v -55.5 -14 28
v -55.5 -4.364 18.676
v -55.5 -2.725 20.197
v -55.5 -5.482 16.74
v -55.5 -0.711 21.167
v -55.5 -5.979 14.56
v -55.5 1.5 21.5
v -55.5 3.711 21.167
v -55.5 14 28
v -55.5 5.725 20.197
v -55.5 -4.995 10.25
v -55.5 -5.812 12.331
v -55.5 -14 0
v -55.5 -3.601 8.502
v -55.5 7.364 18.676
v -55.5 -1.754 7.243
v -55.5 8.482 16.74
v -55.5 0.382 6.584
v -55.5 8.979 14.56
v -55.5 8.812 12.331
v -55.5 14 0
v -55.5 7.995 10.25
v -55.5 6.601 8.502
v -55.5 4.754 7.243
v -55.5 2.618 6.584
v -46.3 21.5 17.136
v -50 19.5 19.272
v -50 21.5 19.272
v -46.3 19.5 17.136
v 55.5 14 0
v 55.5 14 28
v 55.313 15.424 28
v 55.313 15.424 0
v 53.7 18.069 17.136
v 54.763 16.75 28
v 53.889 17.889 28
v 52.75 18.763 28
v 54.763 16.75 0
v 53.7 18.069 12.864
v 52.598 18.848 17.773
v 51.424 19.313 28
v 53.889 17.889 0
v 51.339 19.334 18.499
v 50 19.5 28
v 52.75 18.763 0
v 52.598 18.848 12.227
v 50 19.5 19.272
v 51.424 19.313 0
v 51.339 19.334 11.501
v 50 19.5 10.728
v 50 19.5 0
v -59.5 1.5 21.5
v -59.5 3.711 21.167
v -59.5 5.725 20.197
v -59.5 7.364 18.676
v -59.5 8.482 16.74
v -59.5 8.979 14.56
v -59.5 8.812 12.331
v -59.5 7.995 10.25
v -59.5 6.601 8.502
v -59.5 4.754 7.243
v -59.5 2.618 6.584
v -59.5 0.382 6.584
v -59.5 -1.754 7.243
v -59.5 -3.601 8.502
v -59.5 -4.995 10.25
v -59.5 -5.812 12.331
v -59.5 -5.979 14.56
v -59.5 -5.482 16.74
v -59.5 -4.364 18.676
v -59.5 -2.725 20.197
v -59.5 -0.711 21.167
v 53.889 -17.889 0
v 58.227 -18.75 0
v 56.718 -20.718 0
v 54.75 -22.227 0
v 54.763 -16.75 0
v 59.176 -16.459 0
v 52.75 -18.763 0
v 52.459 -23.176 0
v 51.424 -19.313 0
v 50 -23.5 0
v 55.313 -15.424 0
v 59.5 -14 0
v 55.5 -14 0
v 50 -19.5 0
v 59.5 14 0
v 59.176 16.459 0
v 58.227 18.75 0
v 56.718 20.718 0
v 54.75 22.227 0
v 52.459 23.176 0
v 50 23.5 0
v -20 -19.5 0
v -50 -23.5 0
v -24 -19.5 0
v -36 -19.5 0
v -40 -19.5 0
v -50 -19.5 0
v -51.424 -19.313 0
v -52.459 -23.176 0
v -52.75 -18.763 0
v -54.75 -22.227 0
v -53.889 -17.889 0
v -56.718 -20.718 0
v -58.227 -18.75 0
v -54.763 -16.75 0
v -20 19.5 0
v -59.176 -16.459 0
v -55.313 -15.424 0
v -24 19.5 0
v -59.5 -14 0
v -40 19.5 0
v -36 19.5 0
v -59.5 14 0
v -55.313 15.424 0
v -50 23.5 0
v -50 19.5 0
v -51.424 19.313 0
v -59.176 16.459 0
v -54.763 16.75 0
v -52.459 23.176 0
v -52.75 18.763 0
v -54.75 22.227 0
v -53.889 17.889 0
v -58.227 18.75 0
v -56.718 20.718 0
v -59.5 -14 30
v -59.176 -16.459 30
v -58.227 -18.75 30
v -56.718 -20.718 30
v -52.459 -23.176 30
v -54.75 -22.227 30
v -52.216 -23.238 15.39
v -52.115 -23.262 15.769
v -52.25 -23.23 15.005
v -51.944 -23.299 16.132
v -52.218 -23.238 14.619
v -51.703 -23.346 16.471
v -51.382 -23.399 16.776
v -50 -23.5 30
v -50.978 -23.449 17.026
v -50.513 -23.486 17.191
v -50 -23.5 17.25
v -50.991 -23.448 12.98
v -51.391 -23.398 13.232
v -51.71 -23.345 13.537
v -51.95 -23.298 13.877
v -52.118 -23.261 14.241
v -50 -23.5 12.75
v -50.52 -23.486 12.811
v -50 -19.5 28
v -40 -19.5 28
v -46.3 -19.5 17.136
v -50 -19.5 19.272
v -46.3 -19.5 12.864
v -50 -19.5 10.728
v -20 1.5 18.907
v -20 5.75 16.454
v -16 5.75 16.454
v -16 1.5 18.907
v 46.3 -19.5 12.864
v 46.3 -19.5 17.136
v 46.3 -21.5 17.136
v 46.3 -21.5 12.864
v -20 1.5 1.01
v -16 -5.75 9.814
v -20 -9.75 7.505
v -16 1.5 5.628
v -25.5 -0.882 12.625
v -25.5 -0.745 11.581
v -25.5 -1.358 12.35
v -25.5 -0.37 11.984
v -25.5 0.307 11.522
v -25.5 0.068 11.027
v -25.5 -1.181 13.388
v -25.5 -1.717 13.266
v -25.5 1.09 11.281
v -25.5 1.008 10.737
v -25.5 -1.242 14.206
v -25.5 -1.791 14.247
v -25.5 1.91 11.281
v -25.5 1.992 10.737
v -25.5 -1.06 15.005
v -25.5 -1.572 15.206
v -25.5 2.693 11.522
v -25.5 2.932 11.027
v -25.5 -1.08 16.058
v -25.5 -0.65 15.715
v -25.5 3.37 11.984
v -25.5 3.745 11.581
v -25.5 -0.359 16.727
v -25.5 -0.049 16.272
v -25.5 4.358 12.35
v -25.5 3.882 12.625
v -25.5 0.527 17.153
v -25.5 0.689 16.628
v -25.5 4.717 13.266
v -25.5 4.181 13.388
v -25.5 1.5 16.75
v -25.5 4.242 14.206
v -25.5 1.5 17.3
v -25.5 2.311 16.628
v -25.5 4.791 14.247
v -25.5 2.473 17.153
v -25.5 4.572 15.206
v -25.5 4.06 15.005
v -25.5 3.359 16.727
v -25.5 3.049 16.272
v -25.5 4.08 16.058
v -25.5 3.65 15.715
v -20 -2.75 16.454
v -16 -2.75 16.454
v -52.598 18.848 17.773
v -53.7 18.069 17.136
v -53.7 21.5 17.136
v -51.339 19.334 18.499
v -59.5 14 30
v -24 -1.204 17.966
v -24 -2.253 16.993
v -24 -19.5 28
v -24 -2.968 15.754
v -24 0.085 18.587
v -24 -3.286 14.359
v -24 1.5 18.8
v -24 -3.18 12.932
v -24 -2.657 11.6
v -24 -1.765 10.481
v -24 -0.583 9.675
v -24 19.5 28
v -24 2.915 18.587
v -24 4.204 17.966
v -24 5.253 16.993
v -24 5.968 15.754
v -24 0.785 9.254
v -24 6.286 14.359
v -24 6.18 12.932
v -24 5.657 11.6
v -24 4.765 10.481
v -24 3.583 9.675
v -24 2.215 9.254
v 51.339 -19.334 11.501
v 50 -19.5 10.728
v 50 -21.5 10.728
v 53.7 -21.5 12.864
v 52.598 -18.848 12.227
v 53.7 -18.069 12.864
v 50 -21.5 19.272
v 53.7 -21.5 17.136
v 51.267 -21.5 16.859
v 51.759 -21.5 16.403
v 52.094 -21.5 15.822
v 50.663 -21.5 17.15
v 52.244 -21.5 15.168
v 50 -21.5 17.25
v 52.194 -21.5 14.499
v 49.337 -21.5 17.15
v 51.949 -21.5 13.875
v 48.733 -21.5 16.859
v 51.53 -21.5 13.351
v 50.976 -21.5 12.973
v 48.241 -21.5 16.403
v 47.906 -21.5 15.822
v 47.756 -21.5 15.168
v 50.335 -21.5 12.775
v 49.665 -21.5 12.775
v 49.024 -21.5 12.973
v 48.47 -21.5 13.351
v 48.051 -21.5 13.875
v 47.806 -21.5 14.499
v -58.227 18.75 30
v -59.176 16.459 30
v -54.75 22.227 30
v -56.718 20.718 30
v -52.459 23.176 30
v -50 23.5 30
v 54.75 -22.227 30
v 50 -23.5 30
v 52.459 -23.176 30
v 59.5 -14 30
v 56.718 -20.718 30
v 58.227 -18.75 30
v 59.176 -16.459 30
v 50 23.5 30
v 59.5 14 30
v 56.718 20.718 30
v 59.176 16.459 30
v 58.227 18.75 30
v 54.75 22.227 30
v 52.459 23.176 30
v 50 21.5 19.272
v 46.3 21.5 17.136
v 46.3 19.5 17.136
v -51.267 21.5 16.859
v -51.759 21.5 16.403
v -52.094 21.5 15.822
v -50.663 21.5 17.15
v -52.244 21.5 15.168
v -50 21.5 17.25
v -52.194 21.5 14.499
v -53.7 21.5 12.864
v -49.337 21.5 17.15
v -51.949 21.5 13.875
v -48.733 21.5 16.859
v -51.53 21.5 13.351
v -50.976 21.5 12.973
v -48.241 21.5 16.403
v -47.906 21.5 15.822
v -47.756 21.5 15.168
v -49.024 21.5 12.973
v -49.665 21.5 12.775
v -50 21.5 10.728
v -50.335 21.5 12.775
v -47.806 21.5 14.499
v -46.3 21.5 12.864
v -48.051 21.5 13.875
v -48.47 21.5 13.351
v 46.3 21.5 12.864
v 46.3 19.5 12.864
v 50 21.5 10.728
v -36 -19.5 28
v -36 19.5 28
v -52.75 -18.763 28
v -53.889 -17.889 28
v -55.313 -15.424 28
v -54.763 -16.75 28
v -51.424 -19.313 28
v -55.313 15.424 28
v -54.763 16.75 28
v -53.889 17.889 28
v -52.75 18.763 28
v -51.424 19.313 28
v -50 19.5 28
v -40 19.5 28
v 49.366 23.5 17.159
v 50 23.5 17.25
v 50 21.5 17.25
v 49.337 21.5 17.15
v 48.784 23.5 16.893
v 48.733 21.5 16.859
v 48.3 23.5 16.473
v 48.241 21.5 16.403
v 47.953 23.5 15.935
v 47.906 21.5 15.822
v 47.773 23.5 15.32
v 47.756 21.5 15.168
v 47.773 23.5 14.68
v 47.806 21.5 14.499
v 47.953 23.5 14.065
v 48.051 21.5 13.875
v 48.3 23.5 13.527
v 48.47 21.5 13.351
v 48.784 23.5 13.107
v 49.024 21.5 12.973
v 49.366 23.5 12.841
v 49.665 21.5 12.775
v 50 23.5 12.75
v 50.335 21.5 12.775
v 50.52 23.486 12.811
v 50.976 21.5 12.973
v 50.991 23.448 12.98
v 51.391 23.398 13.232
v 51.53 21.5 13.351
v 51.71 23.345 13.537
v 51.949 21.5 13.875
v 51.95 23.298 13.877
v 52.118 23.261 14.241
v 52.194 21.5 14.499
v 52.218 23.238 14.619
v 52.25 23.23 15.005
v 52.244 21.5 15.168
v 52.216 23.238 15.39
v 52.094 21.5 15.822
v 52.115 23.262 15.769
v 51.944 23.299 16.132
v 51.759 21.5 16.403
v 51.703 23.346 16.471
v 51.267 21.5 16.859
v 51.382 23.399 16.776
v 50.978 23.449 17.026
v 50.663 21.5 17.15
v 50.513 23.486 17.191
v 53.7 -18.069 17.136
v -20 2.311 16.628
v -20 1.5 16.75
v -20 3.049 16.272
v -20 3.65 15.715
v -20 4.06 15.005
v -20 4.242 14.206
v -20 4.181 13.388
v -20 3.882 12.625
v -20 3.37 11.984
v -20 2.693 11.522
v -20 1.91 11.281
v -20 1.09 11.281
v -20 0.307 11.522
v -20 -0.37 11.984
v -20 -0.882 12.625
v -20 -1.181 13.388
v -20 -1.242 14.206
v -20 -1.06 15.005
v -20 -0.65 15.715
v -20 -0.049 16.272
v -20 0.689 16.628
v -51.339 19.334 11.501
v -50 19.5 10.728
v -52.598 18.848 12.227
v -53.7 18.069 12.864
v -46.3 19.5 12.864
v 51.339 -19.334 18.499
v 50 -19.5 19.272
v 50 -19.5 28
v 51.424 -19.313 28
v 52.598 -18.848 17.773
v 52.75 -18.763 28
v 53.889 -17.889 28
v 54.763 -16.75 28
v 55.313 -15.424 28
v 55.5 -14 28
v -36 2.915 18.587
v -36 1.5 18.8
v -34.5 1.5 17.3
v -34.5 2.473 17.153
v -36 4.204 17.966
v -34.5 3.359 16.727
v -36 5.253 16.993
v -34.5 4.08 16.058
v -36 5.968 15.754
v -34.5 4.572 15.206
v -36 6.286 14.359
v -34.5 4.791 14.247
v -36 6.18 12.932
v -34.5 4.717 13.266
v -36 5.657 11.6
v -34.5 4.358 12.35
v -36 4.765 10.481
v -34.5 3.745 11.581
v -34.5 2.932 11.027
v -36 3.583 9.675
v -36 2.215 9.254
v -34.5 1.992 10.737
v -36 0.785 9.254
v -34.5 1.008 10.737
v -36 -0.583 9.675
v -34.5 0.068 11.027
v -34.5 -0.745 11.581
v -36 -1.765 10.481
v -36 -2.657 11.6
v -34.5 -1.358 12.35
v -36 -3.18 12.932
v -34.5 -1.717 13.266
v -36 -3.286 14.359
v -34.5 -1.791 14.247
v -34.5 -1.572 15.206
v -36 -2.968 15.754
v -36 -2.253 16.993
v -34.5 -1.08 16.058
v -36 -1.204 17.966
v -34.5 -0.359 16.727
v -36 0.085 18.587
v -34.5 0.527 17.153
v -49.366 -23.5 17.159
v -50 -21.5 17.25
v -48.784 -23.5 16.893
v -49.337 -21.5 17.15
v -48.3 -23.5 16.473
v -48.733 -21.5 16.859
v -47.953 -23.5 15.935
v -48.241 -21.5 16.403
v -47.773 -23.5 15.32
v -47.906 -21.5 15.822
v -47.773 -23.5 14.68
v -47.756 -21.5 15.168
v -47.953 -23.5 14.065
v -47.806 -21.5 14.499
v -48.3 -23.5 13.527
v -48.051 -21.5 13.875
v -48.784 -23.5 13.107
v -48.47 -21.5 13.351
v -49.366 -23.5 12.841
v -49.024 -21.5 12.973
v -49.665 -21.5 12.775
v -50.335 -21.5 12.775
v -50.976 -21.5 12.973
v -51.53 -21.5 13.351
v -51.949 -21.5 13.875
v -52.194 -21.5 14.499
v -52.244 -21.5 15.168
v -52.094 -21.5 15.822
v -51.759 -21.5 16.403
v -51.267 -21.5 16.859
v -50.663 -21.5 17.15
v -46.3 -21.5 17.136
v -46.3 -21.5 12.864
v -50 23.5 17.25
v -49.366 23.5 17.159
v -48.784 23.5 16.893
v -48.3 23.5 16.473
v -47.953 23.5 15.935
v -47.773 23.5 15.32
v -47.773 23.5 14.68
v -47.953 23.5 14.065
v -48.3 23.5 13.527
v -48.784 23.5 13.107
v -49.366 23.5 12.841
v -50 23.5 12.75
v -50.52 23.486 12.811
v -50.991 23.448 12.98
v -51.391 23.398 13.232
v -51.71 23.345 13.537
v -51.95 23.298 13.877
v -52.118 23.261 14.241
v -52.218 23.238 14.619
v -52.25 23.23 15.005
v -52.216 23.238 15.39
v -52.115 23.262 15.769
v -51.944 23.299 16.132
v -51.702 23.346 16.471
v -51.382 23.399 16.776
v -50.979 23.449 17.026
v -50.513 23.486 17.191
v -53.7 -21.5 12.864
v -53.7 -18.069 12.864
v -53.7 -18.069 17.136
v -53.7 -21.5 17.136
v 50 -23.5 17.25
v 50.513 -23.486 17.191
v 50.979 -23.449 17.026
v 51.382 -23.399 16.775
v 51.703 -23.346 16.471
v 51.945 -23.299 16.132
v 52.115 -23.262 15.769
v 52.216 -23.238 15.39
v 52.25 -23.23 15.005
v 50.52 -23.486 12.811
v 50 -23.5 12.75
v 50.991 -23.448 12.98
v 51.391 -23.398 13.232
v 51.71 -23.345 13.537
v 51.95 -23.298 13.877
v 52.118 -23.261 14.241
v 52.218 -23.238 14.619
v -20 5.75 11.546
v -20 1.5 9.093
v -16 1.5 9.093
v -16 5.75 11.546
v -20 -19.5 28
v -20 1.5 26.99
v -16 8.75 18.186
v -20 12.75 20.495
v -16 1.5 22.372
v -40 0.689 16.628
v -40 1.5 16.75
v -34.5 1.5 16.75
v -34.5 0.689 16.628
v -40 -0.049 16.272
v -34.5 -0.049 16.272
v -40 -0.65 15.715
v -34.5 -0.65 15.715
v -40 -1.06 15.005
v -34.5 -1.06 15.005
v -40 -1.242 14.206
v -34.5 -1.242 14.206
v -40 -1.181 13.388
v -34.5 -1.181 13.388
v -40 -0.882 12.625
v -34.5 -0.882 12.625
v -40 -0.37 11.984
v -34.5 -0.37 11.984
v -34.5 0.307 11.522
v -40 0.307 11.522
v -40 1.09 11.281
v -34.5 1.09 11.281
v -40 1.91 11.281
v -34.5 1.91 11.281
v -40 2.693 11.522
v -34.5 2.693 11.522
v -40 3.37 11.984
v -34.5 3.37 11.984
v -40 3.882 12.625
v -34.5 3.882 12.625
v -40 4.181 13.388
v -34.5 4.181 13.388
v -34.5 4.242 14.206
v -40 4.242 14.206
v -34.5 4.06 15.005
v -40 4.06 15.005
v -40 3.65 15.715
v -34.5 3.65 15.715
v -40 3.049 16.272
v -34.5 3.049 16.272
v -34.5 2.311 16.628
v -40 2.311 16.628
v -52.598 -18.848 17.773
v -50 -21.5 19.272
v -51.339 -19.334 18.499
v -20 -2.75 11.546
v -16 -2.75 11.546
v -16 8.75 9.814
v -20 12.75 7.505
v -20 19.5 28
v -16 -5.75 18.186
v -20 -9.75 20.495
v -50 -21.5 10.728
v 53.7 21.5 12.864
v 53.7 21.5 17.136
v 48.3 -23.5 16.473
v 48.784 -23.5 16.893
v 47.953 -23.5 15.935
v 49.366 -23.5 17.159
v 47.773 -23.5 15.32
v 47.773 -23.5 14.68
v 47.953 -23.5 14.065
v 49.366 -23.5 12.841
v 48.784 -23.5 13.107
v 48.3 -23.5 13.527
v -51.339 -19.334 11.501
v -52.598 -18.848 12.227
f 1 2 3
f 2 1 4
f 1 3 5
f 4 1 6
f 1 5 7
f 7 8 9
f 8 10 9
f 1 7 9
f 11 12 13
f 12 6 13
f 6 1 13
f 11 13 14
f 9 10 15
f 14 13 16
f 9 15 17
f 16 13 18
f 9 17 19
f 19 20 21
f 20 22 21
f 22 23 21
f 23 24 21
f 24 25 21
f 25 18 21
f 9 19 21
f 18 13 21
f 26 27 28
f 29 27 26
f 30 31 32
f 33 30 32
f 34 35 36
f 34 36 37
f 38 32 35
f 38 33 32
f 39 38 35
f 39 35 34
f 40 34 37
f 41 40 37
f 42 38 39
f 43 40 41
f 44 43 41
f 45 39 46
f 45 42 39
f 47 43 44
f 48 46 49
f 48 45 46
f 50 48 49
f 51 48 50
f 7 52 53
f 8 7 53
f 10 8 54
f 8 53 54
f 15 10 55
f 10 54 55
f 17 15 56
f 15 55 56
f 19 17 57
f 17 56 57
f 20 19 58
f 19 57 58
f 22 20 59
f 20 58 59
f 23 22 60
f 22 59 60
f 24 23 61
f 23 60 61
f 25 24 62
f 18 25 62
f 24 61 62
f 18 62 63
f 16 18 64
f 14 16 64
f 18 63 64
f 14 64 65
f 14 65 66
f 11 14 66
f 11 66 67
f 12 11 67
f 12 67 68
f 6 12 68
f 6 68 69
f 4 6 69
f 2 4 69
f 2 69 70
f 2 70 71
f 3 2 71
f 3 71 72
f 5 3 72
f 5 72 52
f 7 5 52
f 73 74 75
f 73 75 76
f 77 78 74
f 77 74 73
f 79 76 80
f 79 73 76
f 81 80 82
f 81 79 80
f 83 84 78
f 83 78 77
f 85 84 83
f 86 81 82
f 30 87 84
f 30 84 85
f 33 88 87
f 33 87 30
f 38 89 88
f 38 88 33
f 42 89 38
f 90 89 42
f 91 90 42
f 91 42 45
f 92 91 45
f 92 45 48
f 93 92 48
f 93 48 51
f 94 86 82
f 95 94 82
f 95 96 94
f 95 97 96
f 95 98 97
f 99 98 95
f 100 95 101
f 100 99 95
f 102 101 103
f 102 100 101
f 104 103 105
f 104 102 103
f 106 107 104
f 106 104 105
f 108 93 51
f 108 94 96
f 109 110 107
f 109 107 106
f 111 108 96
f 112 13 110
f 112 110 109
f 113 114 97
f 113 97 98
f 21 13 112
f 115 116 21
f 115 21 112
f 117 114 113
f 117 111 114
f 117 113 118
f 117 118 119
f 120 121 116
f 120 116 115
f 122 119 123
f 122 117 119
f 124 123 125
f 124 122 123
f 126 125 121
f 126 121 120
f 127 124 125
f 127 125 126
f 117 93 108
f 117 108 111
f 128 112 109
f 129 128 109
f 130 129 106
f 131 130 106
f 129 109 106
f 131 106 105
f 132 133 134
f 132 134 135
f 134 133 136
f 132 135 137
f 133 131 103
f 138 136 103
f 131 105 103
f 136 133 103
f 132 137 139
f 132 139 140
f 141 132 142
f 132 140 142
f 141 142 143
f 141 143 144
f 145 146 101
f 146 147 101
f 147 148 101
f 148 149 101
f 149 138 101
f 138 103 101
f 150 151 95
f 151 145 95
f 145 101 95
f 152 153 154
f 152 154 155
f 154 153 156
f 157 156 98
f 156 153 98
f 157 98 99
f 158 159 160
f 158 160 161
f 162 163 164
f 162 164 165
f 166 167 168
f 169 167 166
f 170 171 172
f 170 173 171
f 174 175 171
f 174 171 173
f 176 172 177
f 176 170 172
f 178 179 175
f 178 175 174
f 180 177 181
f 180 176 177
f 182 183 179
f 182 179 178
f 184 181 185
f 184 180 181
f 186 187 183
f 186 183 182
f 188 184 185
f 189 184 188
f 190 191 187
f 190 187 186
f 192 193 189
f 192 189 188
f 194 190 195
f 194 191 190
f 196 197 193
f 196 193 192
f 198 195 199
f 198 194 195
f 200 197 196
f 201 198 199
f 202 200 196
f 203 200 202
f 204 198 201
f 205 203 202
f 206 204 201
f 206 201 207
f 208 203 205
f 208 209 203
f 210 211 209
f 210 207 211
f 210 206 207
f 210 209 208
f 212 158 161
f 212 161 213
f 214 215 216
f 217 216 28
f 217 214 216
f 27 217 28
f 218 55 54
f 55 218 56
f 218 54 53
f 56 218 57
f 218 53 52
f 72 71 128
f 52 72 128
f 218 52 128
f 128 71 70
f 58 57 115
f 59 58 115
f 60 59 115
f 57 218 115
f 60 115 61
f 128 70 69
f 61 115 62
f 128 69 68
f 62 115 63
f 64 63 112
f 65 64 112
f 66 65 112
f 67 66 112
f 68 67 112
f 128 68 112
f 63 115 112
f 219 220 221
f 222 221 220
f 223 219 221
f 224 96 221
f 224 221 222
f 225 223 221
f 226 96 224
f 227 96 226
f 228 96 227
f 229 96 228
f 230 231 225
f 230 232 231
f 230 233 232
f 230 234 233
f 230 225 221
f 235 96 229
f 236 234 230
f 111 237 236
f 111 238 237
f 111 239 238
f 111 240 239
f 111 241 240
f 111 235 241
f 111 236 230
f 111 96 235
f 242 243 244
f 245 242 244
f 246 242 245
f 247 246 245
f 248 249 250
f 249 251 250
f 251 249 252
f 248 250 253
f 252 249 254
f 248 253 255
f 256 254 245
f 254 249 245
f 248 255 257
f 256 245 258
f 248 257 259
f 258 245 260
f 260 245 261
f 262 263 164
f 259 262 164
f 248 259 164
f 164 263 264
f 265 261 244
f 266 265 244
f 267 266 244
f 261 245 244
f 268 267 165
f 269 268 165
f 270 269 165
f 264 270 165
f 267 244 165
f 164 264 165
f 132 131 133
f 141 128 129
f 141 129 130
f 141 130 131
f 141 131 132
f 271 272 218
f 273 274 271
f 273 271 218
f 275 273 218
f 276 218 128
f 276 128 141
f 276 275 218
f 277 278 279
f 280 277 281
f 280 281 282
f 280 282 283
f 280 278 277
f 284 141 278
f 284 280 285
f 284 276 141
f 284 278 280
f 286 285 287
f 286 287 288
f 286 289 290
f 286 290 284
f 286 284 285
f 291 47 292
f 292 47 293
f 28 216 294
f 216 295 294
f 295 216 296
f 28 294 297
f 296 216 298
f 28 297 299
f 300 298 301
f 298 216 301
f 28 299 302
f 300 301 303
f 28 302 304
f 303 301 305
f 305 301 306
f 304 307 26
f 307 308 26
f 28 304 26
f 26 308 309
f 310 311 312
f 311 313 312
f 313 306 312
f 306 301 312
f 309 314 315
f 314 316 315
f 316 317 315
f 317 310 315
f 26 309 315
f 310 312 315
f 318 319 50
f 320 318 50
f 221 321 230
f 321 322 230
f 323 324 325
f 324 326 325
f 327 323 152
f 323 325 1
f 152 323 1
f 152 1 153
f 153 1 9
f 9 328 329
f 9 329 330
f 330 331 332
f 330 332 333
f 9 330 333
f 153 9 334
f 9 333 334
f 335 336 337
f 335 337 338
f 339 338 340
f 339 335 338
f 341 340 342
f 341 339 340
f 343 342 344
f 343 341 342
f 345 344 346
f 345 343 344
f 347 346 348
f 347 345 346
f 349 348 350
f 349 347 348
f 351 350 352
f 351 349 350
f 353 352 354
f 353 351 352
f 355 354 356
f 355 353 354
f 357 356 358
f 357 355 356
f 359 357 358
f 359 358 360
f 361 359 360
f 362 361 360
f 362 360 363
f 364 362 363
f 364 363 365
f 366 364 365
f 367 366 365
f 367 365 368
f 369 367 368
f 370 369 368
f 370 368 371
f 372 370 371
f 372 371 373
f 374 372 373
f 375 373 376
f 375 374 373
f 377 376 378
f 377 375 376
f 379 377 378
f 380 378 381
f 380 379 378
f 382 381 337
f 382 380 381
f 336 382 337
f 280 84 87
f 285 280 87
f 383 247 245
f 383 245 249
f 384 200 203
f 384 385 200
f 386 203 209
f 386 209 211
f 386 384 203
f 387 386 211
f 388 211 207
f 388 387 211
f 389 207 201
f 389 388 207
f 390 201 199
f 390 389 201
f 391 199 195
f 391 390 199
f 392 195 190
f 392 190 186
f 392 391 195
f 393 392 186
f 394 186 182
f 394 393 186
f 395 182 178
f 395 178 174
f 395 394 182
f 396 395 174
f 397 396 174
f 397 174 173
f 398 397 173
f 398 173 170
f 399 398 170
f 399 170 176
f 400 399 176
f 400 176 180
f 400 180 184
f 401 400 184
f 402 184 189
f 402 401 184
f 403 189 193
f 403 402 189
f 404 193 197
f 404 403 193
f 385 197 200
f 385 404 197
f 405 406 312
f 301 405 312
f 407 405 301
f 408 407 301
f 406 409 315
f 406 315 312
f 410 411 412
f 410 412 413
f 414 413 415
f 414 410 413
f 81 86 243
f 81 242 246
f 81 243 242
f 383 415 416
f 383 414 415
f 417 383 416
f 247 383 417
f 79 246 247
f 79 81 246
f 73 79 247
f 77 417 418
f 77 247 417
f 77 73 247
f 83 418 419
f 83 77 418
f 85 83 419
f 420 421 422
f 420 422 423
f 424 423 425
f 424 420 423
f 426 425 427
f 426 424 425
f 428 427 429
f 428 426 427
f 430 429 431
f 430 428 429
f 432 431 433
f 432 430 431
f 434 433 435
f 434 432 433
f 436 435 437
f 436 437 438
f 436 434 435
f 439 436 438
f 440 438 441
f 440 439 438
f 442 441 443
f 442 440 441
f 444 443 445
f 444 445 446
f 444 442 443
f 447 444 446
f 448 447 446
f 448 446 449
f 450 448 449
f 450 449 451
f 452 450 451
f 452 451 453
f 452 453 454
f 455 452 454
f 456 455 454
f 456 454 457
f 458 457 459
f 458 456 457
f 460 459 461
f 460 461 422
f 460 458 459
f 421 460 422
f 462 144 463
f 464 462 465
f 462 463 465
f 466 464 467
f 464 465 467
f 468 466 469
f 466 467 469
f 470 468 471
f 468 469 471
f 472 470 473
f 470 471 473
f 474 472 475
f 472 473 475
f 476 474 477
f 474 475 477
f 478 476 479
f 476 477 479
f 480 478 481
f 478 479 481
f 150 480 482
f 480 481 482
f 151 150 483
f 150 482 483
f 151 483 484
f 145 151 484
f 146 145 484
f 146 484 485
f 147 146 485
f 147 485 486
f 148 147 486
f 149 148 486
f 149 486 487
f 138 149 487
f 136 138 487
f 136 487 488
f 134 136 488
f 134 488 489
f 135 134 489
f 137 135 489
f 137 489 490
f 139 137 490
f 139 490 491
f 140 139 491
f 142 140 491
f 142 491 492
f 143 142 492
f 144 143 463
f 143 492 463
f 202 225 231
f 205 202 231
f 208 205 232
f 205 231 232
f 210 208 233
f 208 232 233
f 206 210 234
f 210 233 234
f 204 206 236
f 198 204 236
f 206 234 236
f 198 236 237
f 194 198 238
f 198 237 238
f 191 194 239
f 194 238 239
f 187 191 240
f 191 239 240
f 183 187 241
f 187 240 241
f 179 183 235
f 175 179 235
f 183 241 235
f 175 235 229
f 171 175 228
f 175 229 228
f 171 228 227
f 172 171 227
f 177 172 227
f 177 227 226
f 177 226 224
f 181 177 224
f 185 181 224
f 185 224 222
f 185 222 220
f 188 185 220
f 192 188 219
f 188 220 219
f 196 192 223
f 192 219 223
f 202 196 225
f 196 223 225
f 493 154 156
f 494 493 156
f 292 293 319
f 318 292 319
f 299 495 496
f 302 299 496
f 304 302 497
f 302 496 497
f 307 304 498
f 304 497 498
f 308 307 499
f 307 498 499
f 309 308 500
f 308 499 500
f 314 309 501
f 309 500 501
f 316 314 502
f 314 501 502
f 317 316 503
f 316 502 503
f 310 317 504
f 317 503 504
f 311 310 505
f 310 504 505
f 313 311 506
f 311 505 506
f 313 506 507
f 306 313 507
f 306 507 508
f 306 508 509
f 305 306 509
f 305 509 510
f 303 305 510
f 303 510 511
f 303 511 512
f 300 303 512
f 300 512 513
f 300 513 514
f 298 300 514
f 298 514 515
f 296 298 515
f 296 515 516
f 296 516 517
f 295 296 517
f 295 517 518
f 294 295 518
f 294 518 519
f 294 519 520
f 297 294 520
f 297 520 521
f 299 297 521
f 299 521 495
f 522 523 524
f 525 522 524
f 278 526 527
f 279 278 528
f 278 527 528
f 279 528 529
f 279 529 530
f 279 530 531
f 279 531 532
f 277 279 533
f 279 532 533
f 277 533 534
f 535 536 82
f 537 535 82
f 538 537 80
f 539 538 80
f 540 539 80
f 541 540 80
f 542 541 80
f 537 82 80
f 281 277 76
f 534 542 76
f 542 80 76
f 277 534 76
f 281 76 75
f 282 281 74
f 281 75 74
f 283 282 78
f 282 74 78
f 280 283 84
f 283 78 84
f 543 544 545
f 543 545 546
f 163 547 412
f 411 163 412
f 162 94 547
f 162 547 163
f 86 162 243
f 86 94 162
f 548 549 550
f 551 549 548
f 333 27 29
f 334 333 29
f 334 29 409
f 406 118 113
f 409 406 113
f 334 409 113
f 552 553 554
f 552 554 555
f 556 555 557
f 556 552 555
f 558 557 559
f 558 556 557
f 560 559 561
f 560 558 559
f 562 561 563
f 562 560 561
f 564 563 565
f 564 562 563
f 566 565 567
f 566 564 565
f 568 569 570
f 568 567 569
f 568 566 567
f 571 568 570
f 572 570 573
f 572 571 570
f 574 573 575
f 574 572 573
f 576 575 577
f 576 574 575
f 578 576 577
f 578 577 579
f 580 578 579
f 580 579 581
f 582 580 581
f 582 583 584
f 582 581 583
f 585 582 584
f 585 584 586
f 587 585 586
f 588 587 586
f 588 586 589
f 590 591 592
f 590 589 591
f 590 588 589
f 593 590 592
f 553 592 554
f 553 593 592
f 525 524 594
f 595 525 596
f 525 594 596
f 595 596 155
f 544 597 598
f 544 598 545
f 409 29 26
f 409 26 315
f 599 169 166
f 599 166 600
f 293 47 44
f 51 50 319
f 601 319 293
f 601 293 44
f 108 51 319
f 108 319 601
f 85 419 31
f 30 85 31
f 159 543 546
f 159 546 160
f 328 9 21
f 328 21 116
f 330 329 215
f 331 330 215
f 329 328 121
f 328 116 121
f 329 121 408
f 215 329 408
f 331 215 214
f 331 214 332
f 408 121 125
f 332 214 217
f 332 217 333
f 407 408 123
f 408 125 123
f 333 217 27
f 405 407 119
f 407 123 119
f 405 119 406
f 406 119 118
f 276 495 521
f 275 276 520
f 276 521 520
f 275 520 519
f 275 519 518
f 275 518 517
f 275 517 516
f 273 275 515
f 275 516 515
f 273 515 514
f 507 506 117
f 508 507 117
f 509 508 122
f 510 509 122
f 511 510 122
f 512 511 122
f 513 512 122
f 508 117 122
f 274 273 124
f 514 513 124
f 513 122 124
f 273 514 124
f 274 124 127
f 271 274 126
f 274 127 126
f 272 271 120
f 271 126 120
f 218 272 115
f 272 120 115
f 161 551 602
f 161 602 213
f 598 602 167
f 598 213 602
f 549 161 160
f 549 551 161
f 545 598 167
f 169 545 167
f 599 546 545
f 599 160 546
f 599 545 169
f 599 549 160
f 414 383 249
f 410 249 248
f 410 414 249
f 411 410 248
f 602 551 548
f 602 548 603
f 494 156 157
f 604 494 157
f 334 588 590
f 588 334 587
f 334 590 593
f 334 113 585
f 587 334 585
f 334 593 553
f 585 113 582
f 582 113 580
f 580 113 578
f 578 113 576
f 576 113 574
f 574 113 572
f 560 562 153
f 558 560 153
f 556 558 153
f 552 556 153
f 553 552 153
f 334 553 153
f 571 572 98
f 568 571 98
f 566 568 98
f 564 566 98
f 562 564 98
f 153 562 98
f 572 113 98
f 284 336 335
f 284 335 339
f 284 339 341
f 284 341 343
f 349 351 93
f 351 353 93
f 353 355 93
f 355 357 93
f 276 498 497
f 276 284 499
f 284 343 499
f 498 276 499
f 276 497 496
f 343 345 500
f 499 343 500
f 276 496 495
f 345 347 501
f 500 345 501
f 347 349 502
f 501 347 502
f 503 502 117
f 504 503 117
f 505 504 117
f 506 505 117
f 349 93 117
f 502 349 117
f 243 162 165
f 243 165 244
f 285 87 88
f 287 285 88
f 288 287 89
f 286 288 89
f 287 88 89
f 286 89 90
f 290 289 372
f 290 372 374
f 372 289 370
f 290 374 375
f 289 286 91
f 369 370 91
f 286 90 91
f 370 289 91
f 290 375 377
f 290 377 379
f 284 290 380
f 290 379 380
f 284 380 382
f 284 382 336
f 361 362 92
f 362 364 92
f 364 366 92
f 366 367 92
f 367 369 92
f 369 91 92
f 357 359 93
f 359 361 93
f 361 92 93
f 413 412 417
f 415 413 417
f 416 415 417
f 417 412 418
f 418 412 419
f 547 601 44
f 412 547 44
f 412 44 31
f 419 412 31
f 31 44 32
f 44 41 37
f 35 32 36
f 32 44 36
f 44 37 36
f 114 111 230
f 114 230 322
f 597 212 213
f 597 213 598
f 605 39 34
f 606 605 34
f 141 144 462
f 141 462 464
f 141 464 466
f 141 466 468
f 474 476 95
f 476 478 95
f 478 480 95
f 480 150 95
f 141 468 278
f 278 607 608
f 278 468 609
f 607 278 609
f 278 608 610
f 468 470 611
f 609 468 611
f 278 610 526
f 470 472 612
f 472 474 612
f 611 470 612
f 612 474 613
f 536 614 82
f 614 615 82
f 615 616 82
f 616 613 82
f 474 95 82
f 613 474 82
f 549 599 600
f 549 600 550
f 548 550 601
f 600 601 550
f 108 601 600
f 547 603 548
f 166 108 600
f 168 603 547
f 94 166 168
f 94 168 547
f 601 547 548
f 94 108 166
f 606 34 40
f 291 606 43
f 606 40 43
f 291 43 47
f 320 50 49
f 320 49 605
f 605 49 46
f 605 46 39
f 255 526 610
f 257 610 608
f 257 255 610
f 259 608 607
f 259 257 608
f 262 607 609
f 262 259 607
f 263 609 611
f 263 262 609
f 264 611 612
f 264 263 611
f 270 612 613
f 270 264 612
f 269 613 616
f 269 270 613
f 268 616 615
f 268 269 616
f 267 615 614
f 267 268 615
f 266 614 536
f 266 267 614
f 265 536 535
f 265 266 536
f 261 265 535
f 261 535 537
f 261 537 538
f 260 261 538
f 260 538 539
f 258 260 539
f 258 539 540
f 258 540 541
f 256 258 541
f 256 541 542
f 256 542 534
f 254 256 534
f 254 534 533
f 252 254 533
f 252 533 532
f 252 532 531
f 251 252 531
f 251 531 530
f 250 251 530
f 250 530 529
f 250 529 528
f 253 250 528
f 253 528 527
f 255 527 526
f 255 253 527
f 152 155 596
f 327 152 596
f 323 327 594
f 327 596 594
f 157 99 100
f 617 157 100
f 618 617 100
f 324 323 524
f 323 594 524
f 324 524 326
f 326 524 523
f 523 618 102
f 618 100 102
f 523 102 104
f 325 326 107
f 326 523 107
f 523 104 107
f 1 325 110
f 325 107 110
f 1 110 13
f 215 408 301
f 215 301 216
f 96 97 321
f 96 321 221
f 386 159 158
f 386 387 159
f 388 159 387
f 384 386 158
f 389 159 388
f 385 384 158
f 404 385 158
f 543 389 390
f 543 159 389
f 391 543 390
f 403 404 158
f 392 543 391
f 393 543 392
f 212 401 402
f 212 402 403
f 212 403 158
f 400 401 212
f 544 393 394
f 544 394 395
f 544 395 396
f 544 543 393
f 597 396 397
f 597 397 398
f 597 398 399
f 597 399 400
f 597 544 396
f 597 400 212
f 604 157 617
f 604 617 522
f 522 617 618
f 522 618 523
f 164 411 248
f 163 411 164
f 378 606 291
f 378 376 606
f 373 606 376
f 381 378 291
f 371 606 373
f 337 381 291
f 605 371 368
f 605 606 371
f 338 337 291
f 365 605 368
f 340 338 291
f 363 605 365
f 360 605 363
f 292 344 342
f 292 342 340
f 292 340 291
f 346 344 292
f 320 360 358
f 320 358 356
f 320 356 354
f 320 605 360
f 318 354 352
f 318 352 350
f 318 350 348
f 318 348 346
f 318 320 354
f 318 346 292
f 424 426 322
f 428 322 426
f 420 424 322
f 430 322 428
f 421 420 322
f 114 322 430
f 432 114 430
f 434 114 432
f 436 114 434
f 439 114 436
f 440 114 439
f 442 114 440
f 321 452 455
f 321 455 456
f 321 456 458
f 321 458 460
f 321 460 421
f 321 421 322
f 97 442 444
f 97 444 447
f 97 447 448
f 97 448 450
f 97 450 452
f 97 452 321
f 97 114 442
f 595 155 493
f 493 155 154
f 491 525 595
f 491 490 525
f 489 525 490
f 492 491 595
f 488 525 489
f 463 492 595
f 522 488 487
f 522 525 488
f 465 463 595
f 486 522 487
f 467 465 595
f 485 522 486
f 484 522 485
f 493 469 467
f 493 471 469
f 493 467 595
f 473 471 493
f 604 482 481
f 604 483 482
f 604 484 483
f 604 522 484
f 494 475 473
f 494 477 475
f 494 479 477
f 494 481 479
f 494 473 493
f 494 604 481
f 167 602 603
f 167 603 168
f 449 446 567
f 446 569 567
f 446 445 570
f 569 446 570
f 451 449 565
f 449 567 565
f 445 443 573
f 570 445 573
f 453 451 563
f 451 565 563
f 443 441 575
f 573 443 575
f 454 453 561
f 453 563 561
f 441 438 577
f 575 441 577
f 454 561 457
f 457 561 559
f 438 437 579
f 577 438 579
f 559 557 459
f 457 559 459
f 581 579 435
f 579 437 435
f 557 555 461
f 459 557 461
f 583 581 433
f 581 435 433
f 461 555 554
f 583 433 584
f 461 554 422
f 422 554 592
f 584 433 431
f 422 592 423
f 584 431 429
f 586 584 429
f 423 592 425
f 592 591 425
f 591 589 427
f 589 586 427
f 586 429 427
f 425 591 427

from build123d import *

# Parameters (mm, degrees)
BOSS_EXTRUDE1_DEPTH     = 28
CUT_EXTRUDE1_DEPTH      = 19
CUT_EXTRUDE1_DEPTH_BACK = 52
SKETCH3_R               = 2.75
BOSS_EXTRUDE2_DEPTH     = 2
SKETCH5_R               = 2.25
CUT_EXTRUDE2_DEPTH      = 50
CUT_EXTRUDE3_DEPTH      = 2
MIRROR3_COPY_1_DEPTH    = 2
SKETCH7_R               = 7.5
CUT_EXTRUDE4_DEPTH      = 10
BOSS_EXTRUDE3_DEPTH     = 4
CHAMFER1_SIZE           = 4
SKETCH9_R               = 3.3
SKETCH9_R_2             = 2.75
BOSS_EXTRUDE4_DEPTH     = 1.5
CHAMFER2_SIZE           = 1.5
CHAMFER3_SIZE           = 1.5
SKETCH10_W              = 16
SKETCH10_H              = 4
BOSS_EXTRUDE5_DEPTH     = 28


with BuildPart() as part:
    # Sketch2 → Boss-Extrude1 (new body)
    with BuildSketch(Plane.XY):
        with BuildLine():
            ThreePointArc((-59.5, 14), (-56.717514421, 20.717514421), (-50, 23.5))
            Line((-50, 23.5), (-36, 23.5))
            Line((-36, 23.5), (-36, -19.5))
            Line((-36, -19.5), (-24, -19.5))
            Line((-24, -19.5), (-24, 23.5))
            Line((-24, 23.5), (50, 23.5))
            ThreePointArc((50, 23.5), (56.717514421, 20.717514421), (59.5, 14))
            Line((59.5, 14), (59.5, -14))
            ThreePointArc((59.5, -14), (56.717514421, -20.717514421), (50, -23.5))
            Line((50, -23.5), (-50, -23.5))
            ThreePointArc((-50, -23.5), (-56.717514421, -20.717514421), (-59.5, -14))
            Line((-59.5, -14), (-59.5, 14))
        make_face()
        with BuildLine():
            ThreePointArc((50, -19.5), (53.889087297, -17.889087297), (55.5, -14))
            Line((55.5, -14), (55.5, 14))
            ThreePointArc((55.5, 14), (53.889087297, 17.889087297), (50, 19.5))
            Line((50, 19.5), (-20, 19.5))
            Line((-20, 19.5), (-20, -19.5))
            Line((-20, -19.5), (50, -19.5))
        make_face(mode=Mode.SUBTRACT)
        with BuildLine():
            Line((-55.5, -14), (-55.5, 14))
            ThreePointArc((-55.5, 14), (-53.889087297, 17.889087297), (-50, 19.5))
            Line((-50, 19.5), (-40, 19.5))
            Line((-40, 19.5), (-40, -19.5))
            Line((-40, -19.5), (-50, -19.5))
            ThreePointArc((-50, -19.5), (-53.889087297, -17.889087297), (-55.5, -14))
        make_face(mode=Mode.SUBTRACT)
    extrude(amount=BOSS_EXTRUDE1_DEPTH)

    # Sketch3 → Cut-Extrude1 (cut, two sides: drawn at the far end of the back side and taken through both)
    with BuildSketch(Plane(origin=(-36, 0, 0), x_dir=(0, 0, -1), z_dir=(1, 0, 0)).offset(-CUT_EXTRUDE1_DEPTH_BACK)):
        with Locations(Location((-14, 1.5, 0), (0, 0, 180))):
            Circle(SKETCH3_R)
    extrude(amount=CUT_EXTRUDE1_DEPTH + CUT_EXTRUDE1_DEPTH_BACK, mode=Mode.SUBTRACT)

    # Sketch4 → Boss-Extrude2 (add)
    with BuildSketch(Plane.XY.offset(28)):
        with BuildLine():
            Line((50, 23.5), (-36, 23.5))
            Line((-36, 23.5), (-50, 23.5))
            ThreePointArc((-50, 23.5), (-56.717514421, 20.717514421), (-59.5, 14))
            Line((-59.5, 14), (-59.5, -14))
            ThreePointArc((-59.5, -14), (-56.717514421, -20.717514421), (-50, -23.5))
            Line((-50, -23.5), (50, -23.5))
            ThreePointArc((50, -23.5), (56.717514421, -20.717514421), (59.5, -14))
            Line((59.5, -14), (59.5, 14))
            ThreePointArc((59.5, 14), (56.717514421, 20.717514421), (50, 23.5))
        make_face()
    extrude(amount=BOSS_EXTRUDE2_DEPTH)

    # Sketch5 → Cut-Extrude2 (cut)
    with BuildSketch(Plane(origin=(0, 23.5, 0), x_dir=(1, 0, 0), z_dir=(0, 1, 0))):
        with Locations(Location((-50, -15, 0), (0, 0, 270))):
            Circle(SKETCH5_R)
    cut_extrude2 = extrude(amount=-CUT_EXTRUDE2_DEPTH, mode=Mode.SUBTRACT)

    # Sketch6 → Cut-Extrude3 (cut, symmetric)
    with BuildSketch(Plane(origin=(0, -19.5, 0), x_dir=(1, 0, 0), z_dir=(0, 1, 0))):
        Polygon((-50, -19.272391992), (-46.3, -17.136195996), (-46.3, -12.863804004), (-50, -10.727608008), (-53.7, -12.863804004), (-53.7, -17.136195996), align=None)
    cut_extrude3 = extrude(amount=CUT_EXTRUDE3_DEPTH, both=True, mode=Mode.SUBTRACT)

    # Mirror1: Cut-Extrude2 across plane
    add(cut_extrude2.mirror(Plane(origin=(0, 0, 0), x_dir=(0, 0, 1), z_dir=(1, 0, 0))), mode=Mode.SUBTRACT)

    # Mirror2: Cut-Extrude3 across plane
    add(cut_extrude3.mirror(Plane.ZX), mode=Mode.SUBTRACT)

    # Mirror3: Cut-Extrude3 across plane
    add(cut_extrude3.mirror(Plane(origin=(0, 0, 0), x_dir=(0, 0, 1), z_dir=(1, 0, 0))), mode=Mode.SUBTRACT)

    # Mirror3 copy 1 sketch → Mirror3 copy 1 (cut, symmetric)
    with BuildSketch(Plane(origin=(0, 19.5, 0), x_dir=(-1, 0, 0), z_dir=(0, -1, 0))):
        Polygon((-50, -19.272391992), (-46.3, -17.136195996), (-46.3, -12.863804004), (-50, -10.727608008), (-53.7, -12.863804004), (-53.7, -17.136195996), align=None)
    extrude(amount=MIRROR3_COPY_1_DEPTH, both=True, mode=Mode.SUBTRACT)

    # Sketch7 → Cut-Extrude4 (cut)
    with BuildSketch(Plane.ZY.offset(59.5)):
        with Locations((14, 1.5)):
            Circle(SKETCH7_R)
    extrude(amount=-CUT_EXTRUDE4_DEPTH, mode=Mode.SUBTRACT)

    # Sketch8 → Boss-Extrude3 (add)
    with BuildSketch(Plane(origin=(-20, 0, 0), x_dir=(0, 0, -1), z_dir=(1, 0, 0))):
        Polygon((-5.628421097, 1.5), (-9.814210548, 8.75), (-18.185789452, 8.75), (-22.371578903, 1.5), (-18.185789452, -5.75), (-9.814210548, -5.75), align=None)
        Polygon((-9.092522712, 1.5), (-11.546261356, 5.75), (-16.453738644, 5.75), (-18.907477288, 1.5), (-16.453738644, -2.75), (-11.546261356, -2.75), align=None, mode=Mode.SUBTRACT)
    extrude(amount=BOSS_EXTRUDE3_DEPTH)

    # Chamfer1
    chamfer1_edges = [part.edges().sort_by_distance(p)[0] for p in [
        (-20, 5.125, 7.721315823),
        (-20, 8.75, 14),
        (-20, 5.125, 20.278684177),
        (-20, -2.125, 20.278684177),
        (-20, -5.75, 14),
        (-20, -2.125, 7.721315823),
    ]]
    chamfer(chamfer1_edges, length=CHAMFER1_SIZE - 0.0001)  # a hair under: the kernel refuses the full size

    # Sketch9 → Boss-Extrude4 (add)
    with BuildSketch(Plane.ZY.offset(24)):
        with Locations((14, 1.5)):
            Circle(SKETCH9_R)
        with Locations((14, 1.5)):
            Circle(SKETCH9_R_2, mode=Mode.SUBTRACT)
    boss_extrude4 = extrude(amount=BOSS_EXTRUDE4_DEPTH)

    # Chamfer2
    chamfer2_edges = [part.edges().sort_by_distance(p)[0] for p in [
        (-24, 1.5, 10.7),
    ]]
    chamfer(chamfer2_edges, length=CHAMFER2_SIZE - 0.0001)  # a hair under: the kernel refuses the full size

    # Mirror6: Boss-Extrude4 across plane
    add(boss_extrude4.mirror(Plane(origin=(-30, 0, 0), x_dir=(0, 0, 1), z_dir=(1, 0, 0))))

    # Chamfer3
    chamfer3_edges = [part.edges().sort_by_distance(p)[0] for p in [
        (-36, 1.5, 10.7),
    ]]
    chamfer(chamfer3_edges, length=CHAMFER3_SIZE - 0.0001)  # a hair under: the kernel refuses the full size

    # Sketch10 → Boss-Extrude5 (add)
    with BuildSketch(Plane(origin=(0, 0, 0), x_dir=(-1, 0, 0), z_dir=(0, 0, -1))):
        with Locations((32, 21.5)):
            Rectangle(SKETCH10_W, SKETCH10_H)
    extrude(amount=-BOSS_EXTRUDE5_DEPTH)


solid = part.part
